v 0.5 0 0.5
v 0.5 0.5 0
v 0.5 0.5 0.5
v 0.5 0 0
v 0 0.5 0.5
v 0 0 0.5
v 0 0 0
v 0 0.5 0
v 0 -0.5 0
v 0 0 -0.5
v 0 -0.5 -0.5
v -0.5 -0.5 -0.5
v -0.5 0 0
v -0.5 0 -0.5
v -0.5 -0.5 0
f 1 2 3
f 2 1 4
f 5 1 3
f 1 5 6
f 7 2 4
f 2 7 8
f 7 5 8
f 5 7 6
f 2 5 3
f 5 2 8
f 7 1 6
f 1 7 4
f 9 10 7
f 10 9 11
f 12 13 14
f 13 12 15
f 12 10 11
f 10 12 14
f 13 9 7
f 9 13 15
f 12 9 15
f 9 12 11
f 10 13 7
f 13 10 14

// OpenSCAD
cube([0.5, 0.5, 0.5]);
mirror([1, 0, 0])
mirror([0, 1, 0])
mirror([0, 0, 1])
cube([0.5, 0.5, 0.5]);
